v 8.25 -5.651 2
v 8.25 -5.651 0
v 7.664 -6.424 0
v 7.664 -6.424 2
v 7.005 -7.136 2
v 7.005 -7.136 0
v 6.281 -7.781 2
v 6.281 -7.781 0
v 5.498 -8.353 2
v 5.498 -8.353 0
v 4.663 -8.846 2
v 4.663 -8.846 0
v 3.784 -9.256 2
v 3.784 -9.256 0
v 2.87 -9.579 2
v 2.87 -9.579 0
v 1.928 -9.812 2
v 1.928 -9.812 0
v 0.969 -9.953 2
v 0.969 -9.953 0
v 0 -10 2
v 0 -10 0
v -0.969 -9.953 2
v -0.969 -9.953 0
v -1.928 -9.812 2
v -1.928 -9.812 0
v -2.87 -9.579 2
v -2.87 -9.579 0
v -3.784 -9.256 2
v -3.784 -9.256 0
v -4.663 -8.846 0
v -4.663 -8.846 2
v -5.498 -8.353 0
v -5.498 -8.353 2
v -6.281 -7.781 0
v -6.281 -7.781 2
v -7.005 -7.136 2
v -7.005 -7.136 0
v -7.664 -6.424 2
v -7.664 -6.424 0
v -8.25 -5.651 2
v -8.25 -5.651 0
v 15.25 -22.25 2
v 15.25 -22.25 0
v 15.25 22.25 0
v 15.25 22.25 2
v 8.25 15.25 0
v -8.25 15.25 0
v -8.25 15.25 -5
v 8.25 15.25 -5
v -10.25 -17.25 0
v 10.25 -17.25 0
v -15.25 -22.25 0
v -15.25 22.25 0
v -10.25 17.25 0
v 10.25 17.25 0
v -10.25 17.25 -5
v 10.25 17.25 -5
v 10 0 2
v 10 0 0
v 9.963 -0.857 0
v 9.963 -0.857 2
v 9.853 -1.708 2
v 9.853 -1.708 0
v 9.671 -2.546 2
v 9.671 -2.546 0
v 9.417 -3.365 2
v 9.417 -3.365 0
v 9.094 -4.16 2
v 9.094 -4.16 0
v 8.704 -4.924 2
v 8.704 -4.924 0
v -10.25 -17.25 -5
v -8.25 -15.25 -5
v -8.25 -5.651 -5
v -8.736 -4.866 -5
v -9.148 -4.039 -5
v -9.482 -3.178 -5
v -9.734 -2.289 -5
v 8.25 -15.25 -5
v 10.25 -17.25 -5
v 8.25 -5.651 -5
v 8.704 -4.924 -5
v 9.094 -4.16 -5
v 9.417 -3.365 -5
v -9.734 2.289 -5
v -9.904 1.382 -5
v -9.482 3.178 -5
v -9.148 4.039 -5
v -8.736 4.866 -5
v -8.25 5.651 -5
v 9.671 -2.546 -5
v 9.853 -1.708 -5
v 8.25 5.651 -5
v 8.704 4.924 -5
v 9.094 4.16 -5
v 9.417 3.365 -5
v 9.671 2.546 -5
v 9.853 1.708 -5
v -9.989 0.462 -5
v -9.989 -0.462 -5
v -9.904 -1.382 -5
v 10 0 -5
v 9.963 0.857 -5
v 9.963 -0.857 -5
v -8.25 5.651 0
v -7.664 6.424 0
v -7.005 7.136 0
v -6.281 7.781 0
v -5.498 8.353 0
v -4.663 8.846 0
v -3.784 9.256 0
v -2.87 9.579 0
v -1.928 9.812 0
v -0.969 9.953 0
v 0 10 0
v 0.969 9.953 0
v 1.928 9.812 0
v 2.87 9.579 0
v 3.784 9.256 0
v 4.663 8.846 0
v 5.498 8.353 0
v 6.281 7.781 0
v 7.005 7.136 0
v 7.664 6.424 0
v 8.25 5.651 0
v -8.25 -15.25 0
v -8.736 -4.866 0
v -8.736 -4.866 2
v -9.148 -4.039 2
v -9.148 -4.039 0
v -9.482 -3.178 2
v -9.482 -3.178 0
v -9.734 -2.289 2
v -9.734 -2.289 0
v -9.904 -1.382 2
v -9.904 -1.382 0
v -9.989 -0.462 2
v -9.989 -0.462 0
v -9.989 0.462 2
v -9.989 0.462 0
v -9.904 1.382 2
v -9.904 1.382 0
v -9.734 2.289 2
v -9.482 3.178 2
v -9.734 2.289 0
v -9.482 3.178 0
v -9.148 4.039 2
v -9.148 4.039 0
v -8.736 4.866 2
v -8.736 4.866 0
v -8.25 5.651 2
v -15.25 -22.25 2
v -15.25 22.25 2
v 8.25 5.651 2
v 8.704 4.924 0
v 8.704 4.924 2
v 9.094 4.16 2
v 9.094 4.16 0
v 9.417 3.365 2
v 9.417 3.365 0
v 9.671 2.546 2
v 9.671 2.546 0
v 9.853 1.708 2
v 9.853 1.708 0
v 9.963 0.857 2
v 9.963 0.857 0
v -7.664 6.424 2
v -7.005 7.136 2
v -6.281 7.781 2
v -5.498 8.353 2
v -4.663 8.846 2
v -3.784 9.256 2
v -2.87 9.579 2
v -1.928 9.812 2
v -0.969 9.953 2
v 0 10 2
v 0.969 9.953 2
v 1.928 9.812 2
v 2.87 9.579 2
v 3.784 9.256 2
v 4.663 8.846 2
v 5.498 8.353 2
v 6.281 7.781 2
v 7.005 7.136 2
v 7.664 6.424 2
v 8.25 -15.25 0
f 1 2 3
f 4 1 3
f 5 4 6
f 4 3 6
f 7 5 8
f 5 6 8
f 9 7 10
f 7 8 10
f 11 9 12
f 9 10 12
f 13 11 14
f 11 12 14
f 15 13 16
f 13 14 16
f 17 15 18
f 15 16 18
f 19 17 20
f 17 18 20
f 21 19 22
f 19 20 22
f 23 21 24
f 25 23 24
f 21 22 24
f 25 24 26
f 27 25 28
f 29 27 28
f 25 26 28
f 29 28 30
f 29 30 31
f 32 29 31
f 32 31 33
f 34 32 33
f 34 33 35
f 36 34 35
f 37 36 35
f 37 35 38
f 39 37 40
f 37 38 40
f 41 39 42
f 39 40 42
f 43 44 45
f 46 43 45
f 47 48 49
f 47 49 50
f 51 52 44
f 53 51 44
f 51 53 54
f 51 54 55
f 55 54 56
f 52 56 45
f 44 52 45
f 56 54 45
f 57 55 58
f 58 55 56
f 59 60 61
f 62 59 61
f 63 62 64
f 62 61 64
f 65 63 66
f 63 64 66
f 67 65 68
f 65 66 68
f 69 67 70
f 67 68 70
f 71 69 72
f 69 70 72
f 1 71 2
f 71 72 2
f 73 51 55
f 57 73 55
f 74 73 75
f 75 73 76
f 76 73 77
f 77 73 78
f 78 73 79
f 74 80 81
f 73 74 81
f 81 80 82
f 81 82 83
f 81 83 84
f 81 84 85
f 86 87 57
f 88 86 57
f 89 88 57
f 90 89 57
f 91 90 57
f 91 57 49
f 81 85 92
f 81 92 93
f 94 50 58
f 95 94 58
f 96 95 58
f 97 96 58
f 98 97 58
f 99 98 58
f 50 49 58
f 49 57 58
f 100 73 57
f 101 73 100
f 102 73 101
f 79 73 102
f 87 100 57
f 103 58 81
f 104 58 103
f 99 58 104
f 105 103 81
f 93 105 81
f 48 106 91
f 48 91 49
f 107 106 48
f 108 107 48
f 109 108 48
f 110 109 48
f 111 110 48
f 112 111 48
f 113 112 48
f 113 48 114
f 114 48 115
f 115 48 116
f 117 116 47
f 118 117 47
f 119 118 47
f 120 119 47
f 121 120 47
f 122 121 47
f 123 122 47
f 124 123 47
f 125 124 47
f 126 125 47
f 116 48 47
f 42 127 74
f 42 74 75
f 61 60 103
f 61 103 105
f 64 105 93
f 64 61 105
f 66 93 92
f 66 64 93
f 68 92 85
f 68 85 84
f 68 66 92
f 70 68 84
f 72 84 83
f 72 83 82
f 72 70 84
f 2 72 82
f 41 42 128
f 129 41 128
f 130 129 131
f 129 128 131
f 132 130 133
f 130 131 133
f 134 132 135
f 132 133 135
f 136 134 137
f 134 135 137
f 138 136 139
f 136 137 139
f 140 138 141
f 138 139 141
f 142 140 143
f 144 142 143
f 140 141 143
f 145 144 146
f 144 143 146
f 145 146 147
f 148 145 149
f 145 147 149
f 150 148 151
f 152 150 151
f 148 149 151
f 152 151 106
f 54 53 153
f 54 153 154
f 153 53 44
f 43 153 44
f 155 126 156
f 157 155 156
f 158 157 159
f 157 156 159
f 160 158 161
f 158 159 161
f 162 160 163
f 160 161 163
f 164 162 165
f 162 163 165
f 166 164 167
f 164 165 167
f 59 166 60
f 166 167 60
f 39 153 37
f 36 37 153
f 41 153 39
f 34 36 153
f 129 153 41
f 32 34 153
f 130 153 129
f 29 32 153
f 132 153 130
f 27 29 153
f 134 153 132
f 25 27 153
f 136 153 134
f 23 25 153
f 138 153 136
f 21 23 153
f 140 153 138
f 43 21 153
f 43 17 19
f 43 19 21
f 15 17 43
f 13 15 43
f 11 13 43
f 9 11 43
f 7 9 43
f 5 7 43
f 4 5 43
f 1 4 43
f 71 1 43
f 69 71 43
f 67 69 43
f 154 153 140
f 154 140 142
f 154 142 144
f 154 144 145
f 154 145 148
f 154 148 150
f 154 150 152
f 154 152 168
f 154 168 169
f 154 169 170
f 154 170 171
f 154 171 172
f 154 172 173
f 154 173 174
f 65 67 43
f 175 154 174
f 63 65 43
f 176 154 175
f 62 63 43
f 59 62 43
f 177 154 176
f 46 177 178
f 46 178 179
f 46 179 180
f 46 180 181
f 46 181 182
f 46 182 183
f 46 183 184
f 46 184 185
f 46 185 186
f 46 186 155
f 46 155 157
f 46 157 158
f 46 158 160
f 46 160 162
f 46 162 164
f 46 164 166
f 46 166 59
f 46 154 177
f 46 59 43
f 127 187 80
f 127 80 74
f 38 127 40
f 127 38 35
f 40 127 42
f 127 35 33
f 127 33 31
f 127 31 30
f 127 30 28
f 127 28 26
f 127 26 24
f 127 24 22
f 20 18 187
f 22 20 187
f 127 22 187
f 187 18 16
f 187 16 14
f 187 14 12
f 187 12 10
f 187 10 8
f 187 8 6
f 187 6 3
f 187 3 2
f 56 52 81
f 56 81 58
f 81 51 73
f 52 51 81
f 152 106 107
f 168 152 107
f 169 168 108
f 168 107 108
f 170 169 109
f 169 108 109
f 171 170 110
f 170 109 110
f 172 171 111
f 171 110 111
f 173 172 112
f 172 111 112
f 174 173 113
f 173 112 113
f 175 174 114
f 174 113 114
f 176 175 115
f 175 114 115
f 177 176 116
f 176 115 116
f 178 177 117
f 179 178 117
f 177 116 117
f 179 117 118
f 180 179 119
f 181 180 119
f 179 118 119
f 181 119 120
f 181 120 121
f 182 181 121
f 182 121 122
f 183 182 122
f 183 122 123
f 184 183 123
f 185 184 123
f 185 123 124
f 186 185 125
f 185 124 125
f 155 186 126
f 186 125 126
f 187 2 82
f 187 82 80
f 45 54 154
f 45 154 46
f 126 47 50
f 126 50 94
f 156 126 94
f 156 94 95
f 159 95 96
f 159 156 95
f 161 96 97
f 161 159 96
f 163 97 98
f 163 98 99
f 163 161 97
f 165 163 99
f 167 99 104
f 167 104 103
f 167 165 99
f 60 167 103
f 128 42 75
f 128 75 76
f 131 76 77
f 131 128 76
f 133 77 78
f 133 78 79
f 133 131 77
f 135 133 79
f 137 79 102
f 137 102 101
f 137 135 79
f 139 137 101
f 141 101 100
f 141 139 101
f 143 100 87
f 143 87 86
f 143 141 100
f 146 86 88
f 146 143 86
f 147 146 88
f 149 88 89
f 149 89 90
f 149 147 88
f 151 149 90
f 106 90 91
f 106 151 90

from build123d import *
from build123d import SkipClean  # not in build123d's __all__

# Parameters (mm, degrees)
F0_W     = 30.5
F0_H     = 44.5
F0_W_2   = 20.5
F0_H_2   = 34.5
F1_DEPTH = 2
F2_DEPTH = 5


with BuildPart() as f1:
    # F0 (on Top) → F1 (new body)
    with BuildSketch(Plane.XY):
        Rectangle(F0_W, F0_H)
        Rectangle(F0_W_2, F0_H_2, mode=Mode.SUBTRACT)
        Rectangle(F0_W_2, F0_H_2)
        with BuildLine():
            ThreePointArc((8.25, 5.6513272777), (9.5524865873, 2.9580398915), (10, 0))
            ThreePointArc((10, 0), (9.5524865873, -2.9580398915), (8.25, -5.6513272777))
            Line((8.25, -5.6513272777), (8.25, -15.25))
            Line((8.25, -15.25), (-8.25, -15.25))
            Line((-8.25, -15.25), (-8.25, -5.6513272777))
            ThreePointArc((-8.25, -5.6513272777), (-10, 0), (-8.25, 5.6513272777))
            Line((-8.25, 5.6513272777), (-8.25, 15.25))
            Line((-8.25, 15.25), (8.25, 15.25))
            Line((8.25, 15.25), (8.25, 5.6513272777))
        make_face(mode=Mode.SUBTRACT)
        with BuildLine():
            ThreePointArc((-8.25, 5.6513272777), (0, 10), (8.25, 5.6513272777))
            Line((8.25, 5.6513272777), (8.25, 15.25))
            Line((8.25, 15.25), (-8.25, 15.25))
            Line((-8.25, 15.25), (-8.25, 5.6513272777))
        make_face()
        with BuildLine():
            Line((8.25, -15.25), (8.25, -5.6513272777))
            ThreePointArc((8.25, -5.6513272777), (0, -10), (-8.25, -5.6513272777))
            Line((-8.25, -5.6513272777), (-8.25, -15.25))
            Line((-8.25, -15.25), (8.25, -15.25))
        make_face()
    extrude(amount=F1_DEPTH)

    # F0 (on Top) → F2 (join)
    with BuildSketch(Plane.XY):
        Rectangle(F0_W_2, F0_H_2)
        with BuildLine():
            ThreePointArc((8.25, 5.6513272777), (9.5524865873, 2.9580398915), (10, 0))
            ThreePointArc((10, 0), (9.5524865873, -2.9580398915), (8.25, -5.6513272777))
            Line((8.25, -5.6513272777), (8.25, -15.25))
            Line((8.25, -15.25), (-8.25, -15.25))
            Line((-8.25, -15.25), (-8.25, -5.6513272777))
            ThreePointArc((-8.25, -5.6513272777), (-10, 0), (-8.25, 5.6513272777))
            Line((-8.25, 5.6513272777), (-8.25, 15.25))
            Line((-8.25, 15.25), (8.25, 15.25))
            Line((8.25, 15.25), (8.25, 5.6513272777))
        make_face(mode=Mode.SUBTRACT)
    with SkipClean():  # cleaning this boolean's faces spoils the solid; the shape is the same uncleaned
        extrude(amount=-F2_DEPTH)


solid = f1.part
